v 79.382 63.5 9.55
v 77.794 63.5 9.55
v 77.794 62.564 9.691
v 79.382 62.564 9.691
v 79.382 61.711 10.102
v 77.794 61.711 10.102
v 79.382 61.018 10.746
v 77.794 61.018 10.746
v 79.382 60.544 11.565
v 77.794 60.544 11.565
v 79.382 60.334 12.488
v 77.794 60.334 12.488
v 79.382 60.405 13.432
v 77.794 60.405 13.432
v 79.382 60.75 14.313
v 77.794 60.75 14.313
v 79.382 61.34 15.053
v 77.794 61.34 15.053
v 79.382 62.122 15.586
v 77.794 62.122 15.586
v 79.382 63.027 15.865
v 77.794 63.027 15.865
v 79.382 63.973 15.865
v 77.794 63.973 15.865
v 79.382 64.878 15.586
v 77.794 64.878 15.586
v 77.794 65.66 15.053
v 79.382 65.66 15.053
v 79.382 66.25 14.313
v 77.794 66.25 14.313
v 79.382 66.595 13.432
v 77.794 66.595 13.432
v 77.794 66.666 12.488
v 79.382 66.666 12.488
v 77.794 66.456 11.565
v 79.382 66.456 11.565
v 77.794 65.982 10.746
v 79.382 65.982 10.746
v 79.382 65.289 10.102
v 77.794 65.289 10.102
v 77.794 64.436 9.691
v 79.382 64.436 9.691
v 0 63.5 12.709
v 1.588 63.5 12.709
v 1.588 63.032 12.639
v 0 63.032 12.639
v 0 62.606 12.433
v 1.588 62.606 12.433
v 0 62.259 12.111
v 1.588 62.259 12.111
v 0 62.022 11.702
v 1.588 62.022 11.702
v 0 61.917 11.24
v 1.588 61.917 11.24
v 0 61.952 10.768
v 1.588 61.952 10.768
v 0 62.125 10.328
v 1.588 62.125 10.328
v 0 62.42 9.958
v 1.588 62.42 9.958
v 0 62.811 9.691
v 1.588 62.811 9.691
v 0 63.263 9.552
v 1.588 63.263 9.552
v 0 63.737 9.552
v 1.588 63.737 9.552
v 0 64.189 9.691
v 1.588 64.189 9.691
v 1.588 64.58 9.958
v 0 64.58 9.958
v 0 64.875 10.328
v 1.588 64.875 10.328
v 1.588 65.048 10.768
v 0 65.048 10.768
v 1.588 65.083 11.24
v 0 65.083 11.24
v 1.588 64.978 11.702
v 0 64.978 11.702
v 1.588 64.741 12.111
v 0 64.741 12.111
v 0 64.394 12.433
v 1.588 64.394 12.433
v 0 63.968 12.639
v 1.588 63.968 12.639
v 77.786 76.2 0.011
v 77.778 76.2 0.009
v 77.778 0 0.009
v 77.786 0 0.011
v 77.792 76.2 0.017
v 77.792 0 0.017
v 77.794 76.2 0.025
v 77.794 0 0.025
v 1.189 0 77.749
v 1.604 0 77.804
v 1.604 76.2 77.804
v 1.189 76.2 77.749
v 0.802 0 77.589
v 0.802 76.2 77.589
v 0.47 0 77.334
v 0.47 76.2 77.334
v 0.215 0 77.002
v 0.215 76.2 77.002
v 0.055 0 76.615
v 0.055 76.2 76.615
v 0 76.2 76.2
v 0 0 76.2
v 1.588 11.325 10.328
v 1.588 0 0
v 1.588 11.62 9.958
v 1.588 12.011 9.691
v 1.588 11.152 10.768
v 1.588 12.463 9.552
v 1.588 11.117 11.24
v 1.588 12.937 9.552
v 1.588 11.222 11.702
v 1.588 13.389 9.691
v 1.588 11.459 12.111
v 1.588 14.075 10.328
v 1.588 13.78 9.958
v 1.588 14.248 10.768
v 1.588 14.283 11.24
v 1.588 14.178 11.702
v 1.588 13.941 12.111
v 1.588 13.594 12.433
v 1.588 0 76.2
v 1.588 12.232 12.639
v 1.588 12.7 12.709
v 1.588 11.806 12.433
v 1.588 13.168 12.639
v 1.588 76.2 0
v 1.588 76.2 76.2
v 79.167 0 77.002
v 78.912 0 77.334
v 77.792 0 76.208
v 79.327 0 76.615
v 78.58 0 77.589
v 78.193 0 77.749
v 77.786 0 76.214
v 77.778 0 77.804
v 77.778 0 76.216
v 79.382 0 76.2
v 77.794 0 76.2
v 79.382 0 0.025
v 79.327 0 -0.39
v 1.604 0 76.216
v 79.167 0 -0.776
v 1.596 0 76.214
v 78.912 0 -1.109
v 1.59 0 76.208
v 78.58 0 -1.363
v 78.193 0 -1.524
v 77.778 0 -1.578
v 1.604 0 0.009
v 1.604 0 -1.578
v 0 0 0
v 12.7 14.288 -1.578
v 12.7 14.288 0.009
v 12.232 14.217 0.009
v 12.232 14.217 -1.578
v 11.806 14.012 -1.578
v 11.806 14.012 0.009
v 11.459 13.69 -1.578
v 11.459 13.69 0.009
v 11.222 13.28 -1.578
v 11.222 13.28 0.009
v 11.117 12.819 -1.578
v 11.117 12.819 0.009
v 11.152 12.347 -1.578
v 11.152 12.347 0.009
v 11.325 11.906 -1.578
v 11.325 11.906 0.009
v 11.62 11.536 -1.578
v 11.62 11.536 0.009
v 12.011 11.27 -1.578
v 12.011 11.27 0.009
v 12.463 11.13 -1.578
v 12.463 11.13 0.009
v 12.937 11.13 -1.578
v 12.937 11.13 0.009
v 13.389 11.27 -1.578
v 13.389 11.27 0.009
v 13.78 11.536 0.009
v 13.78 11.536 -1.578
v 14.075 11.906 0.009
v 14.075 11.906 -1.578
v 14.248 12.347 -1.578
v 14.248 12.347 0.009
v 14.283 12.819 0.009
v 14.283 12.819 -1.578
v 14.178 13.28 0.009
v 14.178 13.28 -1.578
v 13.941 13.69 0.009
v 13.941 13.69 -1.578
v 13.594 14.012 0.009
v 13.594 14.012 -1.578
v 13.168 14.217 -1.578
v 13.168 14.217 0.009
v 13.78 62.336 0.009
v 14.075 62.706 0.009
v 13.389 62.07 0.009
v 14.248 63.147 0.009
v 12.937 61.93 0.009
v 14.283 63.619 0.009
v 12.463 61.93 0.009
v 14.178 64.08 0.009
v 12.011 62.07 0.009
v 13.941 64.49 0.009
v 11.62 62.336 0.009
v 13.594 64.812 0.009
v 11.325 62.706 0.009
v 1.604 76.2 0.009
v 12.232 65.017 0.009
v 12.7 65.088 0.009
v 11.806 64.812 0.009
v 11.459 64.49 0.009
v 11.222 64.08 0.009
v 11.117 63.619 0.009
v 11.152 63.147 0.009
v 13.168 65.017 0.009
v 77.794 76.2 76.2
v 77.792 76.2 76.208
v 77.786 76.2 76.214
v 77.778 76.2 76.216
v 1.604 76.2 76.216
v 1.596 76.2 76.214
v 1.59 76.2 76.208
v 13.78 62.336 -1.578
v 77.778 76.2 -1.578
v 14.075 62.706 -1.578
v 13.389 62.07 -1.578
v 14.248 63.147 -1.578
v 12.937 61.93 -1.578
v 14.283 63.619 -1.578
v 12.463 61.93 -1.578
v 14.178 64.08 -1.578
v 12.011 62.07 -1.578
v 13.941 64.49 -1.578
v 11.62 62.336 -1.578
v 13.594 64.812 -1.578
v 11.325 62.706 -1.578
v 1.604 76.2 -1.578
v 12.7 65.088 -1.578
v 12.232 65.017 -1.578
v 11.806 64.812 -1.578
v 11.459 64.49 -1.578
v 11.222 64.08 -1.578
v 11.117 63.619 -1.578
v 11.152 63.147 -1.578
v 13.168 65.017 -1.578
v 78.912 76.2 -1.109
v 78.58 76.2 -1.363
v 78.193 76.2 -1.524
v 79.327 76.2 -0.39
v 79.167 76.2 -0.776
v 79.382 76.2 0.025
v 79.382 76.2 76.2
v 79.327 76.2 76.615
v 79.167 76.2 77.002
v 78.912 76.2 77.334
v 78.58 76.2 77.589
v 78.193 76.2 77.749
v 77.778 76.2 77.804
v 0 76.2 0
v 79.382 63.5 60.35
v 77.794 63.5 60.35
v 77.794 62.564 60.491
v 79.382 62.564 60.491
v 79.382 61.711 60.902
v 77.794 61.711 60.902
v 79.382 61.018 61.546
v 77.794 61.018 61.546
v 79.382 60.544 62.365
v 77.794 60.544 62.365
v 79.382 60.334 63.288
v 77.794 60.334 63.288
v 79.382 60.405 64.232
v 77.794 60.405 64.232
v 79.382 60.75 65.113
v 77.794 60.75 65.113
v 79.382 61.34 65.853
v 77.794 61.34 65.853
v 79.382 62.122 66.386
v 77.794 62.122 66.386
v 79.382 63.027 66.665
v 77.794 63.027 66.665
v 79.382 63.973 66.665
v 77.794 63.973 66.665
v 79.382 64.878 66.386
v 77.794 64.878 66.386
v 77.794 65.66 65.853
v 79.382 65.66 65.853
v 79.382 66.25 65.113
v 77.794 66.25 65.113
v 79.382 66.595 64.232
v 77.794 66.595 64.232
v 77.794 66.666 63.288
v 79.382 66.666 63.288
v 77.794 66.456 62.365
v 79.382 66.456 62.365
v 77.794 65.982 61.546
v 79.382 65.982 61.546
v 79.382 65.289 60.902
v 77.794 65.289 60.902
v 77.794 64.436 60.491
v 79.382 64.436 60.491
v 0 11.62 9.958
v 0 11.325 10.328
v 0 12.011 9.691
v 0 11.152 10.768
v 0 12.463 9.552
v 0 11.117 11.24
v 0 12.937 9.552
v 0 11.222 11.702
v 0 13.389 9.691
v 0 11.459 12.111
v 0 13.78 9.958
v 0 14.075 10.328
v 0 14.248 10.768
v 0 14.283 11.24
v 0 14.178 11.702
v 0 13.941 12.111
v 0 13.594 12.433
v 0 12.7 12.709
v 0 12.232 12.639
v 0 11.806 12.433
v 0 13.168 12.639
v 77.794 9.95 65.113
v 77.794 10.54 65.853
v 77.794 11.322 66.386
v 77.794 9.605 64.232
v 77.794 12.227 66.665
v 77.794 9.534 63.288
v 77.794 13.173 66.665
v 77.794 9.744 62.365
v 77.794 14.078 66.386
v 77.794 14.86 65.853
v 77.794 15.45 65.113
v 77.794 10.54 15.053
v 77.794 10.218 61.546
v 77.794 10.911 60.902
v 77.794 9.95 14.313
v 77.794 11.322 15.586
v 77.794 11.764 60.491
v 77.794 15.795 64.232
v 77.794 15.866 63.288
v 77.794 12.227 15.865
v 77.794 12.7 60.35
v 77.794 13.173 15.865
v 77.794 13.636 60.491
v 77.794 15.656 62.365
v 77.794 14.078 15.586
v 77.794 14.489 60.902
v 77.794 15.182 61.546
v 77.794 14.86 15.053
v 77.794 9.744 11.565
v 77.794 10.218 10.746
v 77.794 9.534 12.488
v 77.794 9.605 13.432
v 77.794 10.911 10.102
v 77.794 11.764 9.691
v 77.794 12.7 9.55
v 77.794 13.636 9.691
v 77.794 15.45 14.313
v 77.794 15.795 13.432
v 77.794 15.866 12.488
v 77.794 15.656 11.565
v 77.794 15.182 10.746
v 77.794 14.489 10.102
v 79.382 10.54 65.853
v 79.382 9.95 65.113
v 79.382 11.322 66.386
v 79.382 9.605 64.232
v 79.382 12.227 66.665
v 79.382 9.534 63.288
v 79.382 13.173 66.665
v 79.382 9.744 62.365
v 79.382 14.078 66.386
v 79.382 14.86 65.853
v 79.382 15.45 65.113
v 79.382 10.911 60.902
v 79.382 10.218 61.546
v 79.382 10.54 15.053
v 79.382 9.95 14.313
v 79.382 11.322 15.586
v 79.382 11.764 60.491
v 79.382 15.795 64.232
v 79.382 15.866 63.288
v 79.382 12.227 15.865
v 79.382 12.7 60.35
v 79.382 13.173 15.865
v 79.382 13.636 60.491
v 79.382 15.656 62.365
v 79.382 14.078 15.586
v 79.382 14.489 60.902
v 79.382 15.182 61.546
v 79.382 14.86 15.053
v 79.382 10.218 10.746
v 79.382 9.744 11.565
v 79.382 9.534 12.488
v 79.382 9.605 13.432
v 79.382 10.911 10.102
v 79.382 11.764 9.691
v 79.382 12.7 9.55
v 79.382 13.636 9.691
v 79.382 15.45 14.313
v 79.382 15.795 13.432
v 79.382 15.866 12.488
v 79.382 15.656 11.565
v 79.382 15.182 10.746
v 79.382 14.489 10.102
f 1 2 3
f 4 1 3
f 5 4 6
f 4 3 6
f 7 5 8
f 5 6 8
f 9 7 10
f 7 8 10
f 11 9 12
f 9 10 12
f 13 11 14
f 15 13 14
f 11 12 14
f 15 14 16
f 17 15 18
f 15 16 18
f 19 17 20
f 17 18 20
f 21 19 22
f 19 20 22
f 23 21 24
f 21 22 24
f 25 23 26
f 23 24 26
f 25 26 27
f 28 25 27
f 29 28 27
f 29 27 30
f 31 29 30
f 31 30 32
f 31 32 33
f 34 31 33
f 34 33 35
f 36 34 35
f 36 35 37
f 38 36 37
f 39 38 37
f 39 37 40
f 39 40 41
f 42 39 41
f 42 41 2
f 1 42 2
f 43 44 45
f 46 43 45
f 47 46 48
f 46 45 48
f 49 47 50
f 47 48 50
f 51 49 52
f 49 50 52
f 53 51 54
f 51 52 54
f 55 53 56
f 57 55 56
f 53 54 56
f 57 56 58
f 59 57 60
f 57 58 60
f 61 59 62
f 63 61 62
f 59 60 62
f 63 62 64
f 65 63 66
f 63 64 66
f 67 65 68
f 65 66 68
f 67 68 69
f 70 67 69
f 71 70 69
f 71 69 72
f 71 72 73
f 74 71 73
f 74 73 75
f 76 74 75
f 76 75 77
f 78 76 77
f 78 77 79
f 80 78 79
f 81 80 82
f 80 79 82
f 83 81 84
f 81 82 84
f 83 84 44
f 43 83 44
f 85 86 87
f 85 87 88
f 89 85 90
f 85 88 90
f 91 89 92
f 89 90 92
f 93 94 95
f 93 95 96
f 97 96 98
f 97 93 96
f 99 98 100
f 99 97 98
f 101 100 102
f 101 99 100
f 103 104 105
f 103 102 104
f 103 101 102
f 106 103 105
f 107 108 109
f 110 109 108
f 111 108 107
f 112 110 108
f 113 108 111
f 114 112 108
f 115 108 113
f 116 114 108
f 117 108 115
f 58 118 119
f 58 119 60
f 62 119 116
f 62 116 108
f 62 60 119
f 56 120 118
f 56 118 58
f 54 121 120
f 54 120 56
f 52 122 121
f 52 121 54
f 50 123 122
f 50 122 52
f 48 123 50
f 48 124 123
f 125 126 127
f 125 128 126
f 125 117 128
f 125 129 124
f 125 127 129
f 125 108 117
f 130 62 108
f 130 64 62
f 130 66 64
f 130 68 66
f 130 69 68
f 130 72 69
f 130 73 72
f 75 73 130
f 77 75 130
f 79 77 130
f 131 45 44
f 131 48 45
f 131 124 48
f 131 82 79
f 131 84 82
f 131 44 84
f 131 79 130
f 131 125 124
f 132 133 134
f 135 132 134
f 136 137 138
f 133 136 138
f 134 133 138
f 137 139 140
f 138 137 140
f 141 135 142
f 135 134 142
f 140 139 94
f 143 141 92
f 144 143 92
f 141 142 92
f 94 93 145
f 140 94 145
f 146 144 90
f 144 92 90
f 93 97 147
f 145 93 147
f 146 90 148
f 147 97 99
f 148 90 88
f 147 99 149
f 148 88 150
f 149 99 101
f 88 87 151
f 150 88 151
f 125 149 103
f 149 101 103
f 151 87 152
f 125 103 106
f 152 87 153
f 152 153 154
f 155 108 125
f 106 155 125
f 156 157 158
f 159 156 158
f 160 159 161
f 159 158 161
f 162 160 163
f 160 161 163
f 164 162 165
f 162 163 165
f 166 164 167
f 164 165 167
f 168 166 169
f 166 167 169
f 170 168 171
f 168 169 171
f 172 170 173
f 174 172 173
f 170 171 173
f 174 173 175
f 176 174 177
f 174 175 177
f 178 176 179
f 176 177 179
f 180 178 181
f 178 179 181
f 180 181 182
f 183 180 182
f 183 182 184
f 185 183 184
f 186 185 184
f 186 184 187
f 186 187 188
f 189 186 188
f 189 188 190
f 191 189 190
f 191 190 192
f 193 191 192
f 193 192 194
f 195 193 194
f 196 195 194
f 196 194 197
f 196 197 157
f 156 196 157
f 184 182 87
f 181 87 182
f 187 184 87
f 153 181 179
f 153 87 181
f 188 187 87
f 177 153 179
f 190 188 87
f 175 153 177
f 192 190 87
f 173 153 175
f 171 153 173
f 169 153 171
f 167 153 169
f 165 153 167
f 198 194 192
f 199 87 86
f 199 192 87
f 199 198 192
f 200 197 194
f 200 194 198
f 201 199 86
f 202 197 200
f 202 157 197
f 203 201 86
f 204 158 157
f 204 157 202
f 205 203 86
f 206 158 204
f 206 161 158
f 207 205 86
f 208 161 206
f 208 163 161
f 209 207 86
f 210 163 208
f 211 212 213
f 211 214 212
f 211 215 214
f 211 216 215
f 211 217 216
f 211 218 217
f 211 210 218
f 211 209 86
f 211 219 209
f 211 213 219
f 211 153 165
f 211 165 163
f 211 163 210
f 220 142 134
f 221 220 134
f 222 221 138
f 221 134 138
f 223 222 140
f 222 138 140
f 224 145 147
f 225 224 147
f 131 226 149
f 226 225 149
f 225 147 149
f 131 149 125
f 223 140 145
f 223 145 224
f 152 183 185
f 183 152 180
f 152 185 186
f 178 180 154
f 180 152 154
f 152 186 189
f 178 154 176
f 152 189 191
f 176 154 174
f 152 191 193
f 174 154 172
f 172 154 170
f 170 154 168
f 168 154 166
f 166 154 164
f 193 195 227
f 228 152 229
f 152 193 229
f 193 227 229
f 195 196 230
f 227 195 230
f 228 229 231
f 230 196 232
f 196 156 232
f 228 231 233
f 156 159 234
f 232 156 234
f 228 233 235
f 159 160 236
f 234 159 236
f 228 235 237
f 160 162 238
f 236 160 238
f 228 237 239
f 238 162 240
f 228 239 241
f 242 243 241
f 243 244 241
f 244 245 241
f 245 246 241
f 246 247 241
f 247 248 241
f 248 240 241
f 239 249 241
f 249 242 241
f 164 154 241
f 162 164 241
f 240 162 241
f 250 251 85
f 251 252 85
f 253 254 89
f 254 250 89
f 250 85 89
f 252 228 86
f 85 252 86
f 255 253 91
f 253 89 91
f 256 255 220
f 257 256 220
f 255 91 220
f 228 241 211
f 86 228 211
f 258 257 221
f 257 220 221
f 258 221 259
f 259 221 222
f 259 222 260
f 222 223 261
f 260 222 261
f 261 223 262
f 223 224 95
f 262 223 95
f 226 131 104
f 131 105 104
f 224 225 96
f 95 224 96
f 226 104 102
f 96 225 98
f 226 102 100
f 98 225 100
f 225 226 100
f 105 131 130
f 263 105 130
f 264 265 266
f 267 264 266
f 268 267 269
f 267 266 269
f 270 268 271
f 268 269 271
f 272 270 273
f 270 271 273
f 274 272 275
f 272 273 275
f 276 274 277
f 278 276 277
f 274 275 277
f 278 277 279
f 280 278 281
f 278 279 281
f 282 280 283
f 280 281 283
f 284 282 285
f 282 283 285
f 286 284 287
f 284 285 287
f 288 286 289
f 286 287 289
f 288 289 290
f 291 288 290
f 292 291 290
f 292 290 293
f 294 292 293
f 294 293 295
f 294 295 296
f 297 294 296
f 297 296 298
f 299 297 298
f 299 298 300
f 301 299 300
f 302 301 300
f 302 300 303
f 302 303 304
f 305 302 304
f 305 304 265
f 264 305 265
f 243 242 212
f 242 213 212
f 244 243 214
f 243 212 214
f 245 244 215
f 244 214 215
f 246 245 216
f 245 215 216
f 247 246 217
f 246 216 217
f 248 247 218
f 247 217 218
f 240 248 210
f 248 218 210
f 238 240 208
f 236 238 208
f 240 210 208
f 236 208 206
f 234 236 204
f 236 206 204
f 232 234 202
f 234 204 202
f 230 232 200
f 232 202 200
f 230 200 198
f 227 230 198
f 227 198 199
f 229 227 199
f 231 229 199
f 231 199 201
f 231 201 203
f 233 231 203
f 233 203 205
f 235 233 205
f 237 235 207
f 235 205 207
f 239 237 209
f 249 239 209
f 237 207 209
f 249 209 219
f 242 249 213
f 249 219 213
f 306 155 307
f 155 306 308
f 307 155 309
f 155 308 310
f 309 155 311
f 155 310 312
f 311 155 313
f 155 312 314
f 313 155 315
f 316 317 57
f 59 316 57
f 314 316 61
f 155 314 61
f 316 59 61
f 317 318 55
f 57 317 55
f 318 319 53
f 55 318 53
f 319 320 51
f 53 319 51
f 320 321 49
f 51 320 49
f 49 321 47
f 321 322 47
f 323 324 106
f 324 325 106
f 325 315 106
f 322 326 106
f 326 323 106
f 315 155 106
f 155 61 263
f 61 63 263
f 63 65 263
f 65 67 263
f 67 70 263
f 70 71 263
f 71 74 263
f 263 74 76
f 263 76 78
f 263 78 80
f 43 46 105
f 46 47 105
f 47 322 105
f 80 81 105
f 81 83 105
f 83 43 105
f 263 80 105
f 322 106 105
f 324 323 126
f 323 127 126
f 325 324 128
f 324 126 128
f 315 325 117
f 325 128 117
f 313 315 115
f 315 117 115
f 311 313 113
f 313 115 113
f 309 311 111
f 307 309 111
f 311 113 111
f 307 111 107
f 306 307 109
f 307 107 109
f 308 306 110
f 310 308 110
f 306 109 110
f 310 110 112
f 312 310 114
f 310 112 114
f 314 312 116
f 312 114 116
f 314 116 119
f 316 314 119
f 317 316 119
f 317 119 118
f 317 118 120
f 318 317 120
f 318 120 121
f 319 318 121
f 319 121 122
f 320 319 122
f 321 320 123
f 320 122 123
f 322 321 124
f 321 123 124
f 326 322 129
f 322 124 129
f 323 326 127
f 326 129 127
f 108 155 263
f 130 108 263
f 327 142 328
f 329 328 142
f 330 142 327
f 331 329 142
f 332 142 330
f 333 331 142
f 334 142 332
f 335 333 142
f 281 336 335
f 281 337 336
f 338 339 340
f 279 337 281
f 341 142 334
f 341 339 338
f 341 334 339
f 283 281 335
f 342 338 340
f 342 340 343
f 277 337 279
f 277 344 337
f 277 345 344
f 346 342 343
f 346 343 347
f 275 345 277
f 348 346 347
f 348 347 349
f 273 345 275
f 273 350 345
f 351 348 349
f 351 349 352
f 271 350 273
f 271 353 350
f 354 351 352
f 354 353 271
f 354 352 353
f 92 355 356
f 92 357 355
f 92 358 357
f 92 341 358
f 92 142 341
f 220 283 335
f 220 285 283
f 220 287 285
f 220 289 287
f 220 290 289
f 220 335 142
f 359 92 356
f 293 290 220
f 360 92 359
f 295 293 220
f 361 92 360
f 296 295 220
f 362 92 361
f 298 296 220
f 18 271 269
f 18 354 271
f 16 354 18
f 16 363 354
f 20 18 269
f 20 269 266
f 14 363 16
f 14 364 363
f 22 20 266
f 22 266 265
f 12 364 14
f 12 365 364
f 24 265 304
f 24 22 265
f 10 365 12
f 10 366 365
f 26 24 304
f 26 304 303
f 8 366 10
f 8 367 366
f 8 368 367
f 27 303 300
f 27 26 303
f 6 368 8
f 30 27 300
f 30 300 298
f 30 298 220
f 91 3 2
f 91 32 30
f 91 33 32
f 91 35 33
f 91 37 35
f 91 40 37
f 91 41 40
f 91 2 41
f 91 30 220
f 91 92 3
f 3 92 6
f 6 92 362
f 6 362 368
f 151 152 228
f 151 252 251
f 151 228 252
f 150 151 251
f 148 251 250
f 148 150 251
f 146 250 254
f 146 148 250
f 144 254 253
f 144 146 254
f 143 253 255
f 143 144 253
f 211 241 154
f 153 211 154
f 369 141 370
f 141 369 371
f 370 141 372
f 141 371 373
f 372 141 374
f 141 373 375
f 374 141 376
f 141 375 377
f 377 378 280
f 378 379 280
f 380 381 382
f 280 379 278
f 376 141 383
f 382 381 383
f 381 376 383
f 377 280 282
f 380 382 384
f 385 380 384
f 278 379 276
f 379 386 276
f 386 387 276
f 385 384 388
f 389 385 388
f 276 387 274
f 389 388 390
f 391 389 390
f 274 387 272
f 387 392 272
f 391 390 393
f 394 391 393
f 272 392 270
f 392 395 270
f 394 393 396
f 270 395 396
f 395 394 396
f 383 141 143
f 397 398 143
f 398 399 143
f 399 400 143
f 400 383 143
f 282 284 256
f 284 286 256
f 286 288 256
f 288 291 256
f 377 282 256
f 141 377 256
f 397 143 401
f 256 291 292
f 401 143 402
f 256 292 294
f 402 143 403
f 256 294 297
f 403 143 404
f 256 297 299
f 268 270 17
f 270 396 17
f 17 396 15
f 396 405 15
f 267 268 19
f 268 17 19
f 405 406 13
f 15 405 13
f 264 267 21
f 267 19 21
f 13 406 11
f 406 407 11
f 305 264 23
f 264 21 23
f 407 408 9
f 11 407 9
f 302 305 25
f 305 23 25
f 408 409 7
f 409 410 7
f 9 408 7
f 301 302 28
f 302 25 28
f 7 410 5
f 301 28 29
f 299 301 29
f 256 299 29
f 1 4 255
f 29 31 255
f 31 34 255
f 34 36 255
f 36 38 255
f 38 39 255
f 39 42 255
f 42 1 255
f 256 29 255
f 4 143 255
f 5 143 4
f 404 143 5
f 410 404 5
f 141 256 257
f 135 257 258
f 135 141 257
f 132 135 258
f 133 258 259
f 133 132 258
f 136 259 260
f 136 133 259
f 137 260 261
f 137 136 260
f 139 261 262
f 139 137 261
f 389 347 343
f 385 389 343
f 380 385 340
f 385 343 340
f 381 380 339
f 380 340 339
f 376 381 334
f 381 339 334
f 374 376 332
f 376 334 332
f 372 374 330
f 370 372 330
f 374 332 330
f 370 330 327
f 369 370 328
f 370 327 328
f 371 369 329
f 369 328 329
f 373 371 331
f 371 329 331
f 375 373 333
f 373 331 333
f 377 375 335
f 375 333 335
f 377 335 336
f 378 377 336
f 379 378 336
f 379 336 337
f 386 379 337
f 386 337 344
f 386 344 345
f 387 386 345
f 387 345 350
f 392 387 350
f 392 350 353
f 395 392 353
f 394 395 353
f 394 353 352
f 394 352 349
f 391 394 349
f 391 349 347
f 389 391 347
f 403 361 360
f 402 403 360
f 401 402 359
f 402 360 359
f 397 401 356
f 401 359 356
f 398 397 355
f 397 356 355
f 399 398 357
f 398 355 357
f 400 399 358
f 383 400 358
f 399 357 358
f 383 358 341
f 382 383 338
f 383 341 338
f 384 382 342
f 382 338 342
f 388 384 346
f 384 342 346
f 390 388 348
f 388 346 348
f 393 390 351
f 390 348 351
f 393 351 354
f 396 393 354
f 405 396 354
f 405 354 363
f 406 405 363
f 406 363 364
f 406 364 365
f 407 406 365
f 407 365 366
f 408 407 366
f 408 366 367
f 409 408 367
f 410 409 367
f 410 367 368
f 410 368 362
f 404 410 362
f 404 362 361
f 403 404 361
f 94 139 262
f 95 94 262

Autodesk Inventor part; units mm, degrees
ref_plane "YZ Plane" through (0, 0, 0) normal (1, 0, 0) x (0, 1, 0)
ref_plane "XZ Plane" through (0, 0, 0) normal (0, 1, 0) x (-1, 0, 0)
ref_plane "XY Plane" through (0, 0, 0) normal (0, 0, 1) x (1, 0, 0)
sketch "Sketch4" plane through (0, 0, 0) normal (1, 0, 0) x (0, 1, 0)
  line L0 (0, 0) -> (76.2, 0)
  line L1 (76.2, 0) -> (76.2, 304.8)
  line L2 (76.2, 304.8) -> (0, 304.8)
  line L3 (0, 304.8) -> (0, 0)
  dimension "d7" = 76.2
  dimension "d8" = 304.8
extrude "Extrusion2" add sketch "Sketch4" along normal blind 1.5875
sketch "Sketch5" plane through (1.5875, 0, 0) normal (1, 0, 0) x (0, 0, -1)
  line L0 (0, 0) -> (0, 76.2) projected
  line L1 (0, 76.2) -> (-304.8, 76.2) projected
  line L2 (-304.8, 76.2) -> (-304.8, 0) projected
  line L3 (-304.8, 0) -> (0, 0) projected
  line L4 (-228.6, 76.2) -> (-228.6, 0)
  line L5 (-152.4, 76.2) -> (-152.4, 0)
  line L6 (-76.2, 76.2) -> (-76.2, 0)
  dimension "d11" = 76.2
  dimension "d12" = 76.2
  dimension "d13" = 76.2
bend part "Bend Part2" radius 0.0162 angle 90 line through (1.5875, 76.2, 228.6) along (0, -1, 0) centre toward (1, 0, 0) moving side (0, 0, 1) both sides no
sketch "Sketch6" plane through (1.5875, 0, 0) normal (1, 0, 0) x (0, 0, -1)
  line L0 (-228.6, 0) -> (-228.6, 76.2) projected
  line L1 (-228.6, 0) -> (0, 0) projected
  line L2 (0, 76.2) -> (-228.6, 76.2) projected
  line L3 (-152.4, 76.2) -> (-152.4, 0)
  dimension "d16" = 76.2
bend part "Bend Part3" radius 0.0162 angle 90 line through (1.5875, 76.2, 152.4) along (0, -1, 0) centre toward (1, 0, 0) moving side (0, 0, 1) both sides no
sketch "Sketch7" plane through (1.5875, 0, 0) normal (1, 0, 0) x (0, 0, -1)
  line L0 (-152.4, 0) -> (-152.4, 76.2) projected
  line L1 (-152.4, 0) -> (0, 0) projected
  line L2 (0, 76.2) -> (-152.4, 76.2) projected
  line L3 (-76.2, 76.2) -> (-76.2, -0.6756)
  dimension "d19" = 76.2
bend part "Bend Part4" radius 0.0162 angle 90 line through (1.5875, 76.2, 76.2) along (0, -1, 0) centre toward (1, 0, 0) moving side (0, 0, 1) both sides no
sketch "Sketch8" plane through (77.7783, 0, -1.5783) normal (0, 0, -1) x (-1, 0, 0)
  line L0 (76.1746, 0) -> (0, 0) projected
  line L1 (0, 76.2) -> (76.1746, 76.2) projected
  line L2 (77.7783, 0) -> (77.7783, 76.2) projected
  point P0 (65.0783, 63.5)
  point P1 (65.0783, 12.7)
  dimension "d22" = 12.7
  dimension "d23" = 12.7
  dimension "d24" = 12.7
  dimension "d25" = 12.7
hole "Hole1" at (12.7, 63.5, -1.5783) at (12.7, 12.7, -1.5783) direction (0, 0, 1) diameter 3.175 depth 25.4 tip angle 118
sketch "Sketch9" plane through (0, 0, 0) normal (-1, 0, 0) x (0, 0, 1)
  line L0 (0, 76.2) -> (76.2, 76.2) projected
  line L1 (76.2, 0) -> (0, 0) projected
  line L2 (-1.5783, 76.2) -> (-1.5783, 0) projected
  point P0 (11.1217, 63.5)
  point P1 (11.1217, 12.7)
  dimension "d33" = 12.7
  dimension "d34" = 12.7
  dimension "d35" = 12.7
  dimension "d36" = 12.7
hole "Hole2" at (0, 63.5, 11.1217) at (0, 12.7, 11.1217) direction (1, 0, 0) diameter 3.175 depth 25.4 tip angle 118
sketch "Sketch10" plane through (79.3819, 0, 76.2) normal (1, 0, 0) x (0, 0, -1)
  line L0 (0, 76.2) -> (0, 0) projected
  line L1 (76.1746, 0) -> (0, 0) projected
  line L2 (76.1746, 76.2) -> (76.1746, 0) projected
  line L3 (0, 76.2) -> (76.1746, 76.2) projected
  point P0 (76.2, 0)
sketch "Sketch11" plane through (79.3819, 0, 76.2) normal (1, 0, 0) x (0, 0, -1)
  line L0 (76.1746, 76.2) -> (76.1746, 0) projected
  line L1 (0, 76.2) -> (76.1746, 76.2) projected
  line L2 (76.1746, 0) -> (0, 0) projected
  point P0 (76.2, 0)
  point P1 (12.6746, 63.5)
  point P2 (63.4746, 63.5)
  point P3 (12.6746, 12.7)
  point P4 (63.4746, 12.7)
  dimension "d46" = 12.7
  dimension "d47" = 12.7
  dimension "d49" = 12.7
  dimension "d57" = 12.7
  dimension "d58" = 12.7
  dimension "d59" = 50.8
  dimension "d60" = 50.8
  dimension "d61" = 12.7
hole "Hole3" at (79.3819, 63.5, 63.5254) at (79.3819, 63.5, 12.7254) at (79.3819, 12.7, 63.5254) at (79.3819, 12.7, 12.7254) direction (-1, 0, 0) diameter 6.35 depth 25.4 tip angle 118
properties part number "Box"
